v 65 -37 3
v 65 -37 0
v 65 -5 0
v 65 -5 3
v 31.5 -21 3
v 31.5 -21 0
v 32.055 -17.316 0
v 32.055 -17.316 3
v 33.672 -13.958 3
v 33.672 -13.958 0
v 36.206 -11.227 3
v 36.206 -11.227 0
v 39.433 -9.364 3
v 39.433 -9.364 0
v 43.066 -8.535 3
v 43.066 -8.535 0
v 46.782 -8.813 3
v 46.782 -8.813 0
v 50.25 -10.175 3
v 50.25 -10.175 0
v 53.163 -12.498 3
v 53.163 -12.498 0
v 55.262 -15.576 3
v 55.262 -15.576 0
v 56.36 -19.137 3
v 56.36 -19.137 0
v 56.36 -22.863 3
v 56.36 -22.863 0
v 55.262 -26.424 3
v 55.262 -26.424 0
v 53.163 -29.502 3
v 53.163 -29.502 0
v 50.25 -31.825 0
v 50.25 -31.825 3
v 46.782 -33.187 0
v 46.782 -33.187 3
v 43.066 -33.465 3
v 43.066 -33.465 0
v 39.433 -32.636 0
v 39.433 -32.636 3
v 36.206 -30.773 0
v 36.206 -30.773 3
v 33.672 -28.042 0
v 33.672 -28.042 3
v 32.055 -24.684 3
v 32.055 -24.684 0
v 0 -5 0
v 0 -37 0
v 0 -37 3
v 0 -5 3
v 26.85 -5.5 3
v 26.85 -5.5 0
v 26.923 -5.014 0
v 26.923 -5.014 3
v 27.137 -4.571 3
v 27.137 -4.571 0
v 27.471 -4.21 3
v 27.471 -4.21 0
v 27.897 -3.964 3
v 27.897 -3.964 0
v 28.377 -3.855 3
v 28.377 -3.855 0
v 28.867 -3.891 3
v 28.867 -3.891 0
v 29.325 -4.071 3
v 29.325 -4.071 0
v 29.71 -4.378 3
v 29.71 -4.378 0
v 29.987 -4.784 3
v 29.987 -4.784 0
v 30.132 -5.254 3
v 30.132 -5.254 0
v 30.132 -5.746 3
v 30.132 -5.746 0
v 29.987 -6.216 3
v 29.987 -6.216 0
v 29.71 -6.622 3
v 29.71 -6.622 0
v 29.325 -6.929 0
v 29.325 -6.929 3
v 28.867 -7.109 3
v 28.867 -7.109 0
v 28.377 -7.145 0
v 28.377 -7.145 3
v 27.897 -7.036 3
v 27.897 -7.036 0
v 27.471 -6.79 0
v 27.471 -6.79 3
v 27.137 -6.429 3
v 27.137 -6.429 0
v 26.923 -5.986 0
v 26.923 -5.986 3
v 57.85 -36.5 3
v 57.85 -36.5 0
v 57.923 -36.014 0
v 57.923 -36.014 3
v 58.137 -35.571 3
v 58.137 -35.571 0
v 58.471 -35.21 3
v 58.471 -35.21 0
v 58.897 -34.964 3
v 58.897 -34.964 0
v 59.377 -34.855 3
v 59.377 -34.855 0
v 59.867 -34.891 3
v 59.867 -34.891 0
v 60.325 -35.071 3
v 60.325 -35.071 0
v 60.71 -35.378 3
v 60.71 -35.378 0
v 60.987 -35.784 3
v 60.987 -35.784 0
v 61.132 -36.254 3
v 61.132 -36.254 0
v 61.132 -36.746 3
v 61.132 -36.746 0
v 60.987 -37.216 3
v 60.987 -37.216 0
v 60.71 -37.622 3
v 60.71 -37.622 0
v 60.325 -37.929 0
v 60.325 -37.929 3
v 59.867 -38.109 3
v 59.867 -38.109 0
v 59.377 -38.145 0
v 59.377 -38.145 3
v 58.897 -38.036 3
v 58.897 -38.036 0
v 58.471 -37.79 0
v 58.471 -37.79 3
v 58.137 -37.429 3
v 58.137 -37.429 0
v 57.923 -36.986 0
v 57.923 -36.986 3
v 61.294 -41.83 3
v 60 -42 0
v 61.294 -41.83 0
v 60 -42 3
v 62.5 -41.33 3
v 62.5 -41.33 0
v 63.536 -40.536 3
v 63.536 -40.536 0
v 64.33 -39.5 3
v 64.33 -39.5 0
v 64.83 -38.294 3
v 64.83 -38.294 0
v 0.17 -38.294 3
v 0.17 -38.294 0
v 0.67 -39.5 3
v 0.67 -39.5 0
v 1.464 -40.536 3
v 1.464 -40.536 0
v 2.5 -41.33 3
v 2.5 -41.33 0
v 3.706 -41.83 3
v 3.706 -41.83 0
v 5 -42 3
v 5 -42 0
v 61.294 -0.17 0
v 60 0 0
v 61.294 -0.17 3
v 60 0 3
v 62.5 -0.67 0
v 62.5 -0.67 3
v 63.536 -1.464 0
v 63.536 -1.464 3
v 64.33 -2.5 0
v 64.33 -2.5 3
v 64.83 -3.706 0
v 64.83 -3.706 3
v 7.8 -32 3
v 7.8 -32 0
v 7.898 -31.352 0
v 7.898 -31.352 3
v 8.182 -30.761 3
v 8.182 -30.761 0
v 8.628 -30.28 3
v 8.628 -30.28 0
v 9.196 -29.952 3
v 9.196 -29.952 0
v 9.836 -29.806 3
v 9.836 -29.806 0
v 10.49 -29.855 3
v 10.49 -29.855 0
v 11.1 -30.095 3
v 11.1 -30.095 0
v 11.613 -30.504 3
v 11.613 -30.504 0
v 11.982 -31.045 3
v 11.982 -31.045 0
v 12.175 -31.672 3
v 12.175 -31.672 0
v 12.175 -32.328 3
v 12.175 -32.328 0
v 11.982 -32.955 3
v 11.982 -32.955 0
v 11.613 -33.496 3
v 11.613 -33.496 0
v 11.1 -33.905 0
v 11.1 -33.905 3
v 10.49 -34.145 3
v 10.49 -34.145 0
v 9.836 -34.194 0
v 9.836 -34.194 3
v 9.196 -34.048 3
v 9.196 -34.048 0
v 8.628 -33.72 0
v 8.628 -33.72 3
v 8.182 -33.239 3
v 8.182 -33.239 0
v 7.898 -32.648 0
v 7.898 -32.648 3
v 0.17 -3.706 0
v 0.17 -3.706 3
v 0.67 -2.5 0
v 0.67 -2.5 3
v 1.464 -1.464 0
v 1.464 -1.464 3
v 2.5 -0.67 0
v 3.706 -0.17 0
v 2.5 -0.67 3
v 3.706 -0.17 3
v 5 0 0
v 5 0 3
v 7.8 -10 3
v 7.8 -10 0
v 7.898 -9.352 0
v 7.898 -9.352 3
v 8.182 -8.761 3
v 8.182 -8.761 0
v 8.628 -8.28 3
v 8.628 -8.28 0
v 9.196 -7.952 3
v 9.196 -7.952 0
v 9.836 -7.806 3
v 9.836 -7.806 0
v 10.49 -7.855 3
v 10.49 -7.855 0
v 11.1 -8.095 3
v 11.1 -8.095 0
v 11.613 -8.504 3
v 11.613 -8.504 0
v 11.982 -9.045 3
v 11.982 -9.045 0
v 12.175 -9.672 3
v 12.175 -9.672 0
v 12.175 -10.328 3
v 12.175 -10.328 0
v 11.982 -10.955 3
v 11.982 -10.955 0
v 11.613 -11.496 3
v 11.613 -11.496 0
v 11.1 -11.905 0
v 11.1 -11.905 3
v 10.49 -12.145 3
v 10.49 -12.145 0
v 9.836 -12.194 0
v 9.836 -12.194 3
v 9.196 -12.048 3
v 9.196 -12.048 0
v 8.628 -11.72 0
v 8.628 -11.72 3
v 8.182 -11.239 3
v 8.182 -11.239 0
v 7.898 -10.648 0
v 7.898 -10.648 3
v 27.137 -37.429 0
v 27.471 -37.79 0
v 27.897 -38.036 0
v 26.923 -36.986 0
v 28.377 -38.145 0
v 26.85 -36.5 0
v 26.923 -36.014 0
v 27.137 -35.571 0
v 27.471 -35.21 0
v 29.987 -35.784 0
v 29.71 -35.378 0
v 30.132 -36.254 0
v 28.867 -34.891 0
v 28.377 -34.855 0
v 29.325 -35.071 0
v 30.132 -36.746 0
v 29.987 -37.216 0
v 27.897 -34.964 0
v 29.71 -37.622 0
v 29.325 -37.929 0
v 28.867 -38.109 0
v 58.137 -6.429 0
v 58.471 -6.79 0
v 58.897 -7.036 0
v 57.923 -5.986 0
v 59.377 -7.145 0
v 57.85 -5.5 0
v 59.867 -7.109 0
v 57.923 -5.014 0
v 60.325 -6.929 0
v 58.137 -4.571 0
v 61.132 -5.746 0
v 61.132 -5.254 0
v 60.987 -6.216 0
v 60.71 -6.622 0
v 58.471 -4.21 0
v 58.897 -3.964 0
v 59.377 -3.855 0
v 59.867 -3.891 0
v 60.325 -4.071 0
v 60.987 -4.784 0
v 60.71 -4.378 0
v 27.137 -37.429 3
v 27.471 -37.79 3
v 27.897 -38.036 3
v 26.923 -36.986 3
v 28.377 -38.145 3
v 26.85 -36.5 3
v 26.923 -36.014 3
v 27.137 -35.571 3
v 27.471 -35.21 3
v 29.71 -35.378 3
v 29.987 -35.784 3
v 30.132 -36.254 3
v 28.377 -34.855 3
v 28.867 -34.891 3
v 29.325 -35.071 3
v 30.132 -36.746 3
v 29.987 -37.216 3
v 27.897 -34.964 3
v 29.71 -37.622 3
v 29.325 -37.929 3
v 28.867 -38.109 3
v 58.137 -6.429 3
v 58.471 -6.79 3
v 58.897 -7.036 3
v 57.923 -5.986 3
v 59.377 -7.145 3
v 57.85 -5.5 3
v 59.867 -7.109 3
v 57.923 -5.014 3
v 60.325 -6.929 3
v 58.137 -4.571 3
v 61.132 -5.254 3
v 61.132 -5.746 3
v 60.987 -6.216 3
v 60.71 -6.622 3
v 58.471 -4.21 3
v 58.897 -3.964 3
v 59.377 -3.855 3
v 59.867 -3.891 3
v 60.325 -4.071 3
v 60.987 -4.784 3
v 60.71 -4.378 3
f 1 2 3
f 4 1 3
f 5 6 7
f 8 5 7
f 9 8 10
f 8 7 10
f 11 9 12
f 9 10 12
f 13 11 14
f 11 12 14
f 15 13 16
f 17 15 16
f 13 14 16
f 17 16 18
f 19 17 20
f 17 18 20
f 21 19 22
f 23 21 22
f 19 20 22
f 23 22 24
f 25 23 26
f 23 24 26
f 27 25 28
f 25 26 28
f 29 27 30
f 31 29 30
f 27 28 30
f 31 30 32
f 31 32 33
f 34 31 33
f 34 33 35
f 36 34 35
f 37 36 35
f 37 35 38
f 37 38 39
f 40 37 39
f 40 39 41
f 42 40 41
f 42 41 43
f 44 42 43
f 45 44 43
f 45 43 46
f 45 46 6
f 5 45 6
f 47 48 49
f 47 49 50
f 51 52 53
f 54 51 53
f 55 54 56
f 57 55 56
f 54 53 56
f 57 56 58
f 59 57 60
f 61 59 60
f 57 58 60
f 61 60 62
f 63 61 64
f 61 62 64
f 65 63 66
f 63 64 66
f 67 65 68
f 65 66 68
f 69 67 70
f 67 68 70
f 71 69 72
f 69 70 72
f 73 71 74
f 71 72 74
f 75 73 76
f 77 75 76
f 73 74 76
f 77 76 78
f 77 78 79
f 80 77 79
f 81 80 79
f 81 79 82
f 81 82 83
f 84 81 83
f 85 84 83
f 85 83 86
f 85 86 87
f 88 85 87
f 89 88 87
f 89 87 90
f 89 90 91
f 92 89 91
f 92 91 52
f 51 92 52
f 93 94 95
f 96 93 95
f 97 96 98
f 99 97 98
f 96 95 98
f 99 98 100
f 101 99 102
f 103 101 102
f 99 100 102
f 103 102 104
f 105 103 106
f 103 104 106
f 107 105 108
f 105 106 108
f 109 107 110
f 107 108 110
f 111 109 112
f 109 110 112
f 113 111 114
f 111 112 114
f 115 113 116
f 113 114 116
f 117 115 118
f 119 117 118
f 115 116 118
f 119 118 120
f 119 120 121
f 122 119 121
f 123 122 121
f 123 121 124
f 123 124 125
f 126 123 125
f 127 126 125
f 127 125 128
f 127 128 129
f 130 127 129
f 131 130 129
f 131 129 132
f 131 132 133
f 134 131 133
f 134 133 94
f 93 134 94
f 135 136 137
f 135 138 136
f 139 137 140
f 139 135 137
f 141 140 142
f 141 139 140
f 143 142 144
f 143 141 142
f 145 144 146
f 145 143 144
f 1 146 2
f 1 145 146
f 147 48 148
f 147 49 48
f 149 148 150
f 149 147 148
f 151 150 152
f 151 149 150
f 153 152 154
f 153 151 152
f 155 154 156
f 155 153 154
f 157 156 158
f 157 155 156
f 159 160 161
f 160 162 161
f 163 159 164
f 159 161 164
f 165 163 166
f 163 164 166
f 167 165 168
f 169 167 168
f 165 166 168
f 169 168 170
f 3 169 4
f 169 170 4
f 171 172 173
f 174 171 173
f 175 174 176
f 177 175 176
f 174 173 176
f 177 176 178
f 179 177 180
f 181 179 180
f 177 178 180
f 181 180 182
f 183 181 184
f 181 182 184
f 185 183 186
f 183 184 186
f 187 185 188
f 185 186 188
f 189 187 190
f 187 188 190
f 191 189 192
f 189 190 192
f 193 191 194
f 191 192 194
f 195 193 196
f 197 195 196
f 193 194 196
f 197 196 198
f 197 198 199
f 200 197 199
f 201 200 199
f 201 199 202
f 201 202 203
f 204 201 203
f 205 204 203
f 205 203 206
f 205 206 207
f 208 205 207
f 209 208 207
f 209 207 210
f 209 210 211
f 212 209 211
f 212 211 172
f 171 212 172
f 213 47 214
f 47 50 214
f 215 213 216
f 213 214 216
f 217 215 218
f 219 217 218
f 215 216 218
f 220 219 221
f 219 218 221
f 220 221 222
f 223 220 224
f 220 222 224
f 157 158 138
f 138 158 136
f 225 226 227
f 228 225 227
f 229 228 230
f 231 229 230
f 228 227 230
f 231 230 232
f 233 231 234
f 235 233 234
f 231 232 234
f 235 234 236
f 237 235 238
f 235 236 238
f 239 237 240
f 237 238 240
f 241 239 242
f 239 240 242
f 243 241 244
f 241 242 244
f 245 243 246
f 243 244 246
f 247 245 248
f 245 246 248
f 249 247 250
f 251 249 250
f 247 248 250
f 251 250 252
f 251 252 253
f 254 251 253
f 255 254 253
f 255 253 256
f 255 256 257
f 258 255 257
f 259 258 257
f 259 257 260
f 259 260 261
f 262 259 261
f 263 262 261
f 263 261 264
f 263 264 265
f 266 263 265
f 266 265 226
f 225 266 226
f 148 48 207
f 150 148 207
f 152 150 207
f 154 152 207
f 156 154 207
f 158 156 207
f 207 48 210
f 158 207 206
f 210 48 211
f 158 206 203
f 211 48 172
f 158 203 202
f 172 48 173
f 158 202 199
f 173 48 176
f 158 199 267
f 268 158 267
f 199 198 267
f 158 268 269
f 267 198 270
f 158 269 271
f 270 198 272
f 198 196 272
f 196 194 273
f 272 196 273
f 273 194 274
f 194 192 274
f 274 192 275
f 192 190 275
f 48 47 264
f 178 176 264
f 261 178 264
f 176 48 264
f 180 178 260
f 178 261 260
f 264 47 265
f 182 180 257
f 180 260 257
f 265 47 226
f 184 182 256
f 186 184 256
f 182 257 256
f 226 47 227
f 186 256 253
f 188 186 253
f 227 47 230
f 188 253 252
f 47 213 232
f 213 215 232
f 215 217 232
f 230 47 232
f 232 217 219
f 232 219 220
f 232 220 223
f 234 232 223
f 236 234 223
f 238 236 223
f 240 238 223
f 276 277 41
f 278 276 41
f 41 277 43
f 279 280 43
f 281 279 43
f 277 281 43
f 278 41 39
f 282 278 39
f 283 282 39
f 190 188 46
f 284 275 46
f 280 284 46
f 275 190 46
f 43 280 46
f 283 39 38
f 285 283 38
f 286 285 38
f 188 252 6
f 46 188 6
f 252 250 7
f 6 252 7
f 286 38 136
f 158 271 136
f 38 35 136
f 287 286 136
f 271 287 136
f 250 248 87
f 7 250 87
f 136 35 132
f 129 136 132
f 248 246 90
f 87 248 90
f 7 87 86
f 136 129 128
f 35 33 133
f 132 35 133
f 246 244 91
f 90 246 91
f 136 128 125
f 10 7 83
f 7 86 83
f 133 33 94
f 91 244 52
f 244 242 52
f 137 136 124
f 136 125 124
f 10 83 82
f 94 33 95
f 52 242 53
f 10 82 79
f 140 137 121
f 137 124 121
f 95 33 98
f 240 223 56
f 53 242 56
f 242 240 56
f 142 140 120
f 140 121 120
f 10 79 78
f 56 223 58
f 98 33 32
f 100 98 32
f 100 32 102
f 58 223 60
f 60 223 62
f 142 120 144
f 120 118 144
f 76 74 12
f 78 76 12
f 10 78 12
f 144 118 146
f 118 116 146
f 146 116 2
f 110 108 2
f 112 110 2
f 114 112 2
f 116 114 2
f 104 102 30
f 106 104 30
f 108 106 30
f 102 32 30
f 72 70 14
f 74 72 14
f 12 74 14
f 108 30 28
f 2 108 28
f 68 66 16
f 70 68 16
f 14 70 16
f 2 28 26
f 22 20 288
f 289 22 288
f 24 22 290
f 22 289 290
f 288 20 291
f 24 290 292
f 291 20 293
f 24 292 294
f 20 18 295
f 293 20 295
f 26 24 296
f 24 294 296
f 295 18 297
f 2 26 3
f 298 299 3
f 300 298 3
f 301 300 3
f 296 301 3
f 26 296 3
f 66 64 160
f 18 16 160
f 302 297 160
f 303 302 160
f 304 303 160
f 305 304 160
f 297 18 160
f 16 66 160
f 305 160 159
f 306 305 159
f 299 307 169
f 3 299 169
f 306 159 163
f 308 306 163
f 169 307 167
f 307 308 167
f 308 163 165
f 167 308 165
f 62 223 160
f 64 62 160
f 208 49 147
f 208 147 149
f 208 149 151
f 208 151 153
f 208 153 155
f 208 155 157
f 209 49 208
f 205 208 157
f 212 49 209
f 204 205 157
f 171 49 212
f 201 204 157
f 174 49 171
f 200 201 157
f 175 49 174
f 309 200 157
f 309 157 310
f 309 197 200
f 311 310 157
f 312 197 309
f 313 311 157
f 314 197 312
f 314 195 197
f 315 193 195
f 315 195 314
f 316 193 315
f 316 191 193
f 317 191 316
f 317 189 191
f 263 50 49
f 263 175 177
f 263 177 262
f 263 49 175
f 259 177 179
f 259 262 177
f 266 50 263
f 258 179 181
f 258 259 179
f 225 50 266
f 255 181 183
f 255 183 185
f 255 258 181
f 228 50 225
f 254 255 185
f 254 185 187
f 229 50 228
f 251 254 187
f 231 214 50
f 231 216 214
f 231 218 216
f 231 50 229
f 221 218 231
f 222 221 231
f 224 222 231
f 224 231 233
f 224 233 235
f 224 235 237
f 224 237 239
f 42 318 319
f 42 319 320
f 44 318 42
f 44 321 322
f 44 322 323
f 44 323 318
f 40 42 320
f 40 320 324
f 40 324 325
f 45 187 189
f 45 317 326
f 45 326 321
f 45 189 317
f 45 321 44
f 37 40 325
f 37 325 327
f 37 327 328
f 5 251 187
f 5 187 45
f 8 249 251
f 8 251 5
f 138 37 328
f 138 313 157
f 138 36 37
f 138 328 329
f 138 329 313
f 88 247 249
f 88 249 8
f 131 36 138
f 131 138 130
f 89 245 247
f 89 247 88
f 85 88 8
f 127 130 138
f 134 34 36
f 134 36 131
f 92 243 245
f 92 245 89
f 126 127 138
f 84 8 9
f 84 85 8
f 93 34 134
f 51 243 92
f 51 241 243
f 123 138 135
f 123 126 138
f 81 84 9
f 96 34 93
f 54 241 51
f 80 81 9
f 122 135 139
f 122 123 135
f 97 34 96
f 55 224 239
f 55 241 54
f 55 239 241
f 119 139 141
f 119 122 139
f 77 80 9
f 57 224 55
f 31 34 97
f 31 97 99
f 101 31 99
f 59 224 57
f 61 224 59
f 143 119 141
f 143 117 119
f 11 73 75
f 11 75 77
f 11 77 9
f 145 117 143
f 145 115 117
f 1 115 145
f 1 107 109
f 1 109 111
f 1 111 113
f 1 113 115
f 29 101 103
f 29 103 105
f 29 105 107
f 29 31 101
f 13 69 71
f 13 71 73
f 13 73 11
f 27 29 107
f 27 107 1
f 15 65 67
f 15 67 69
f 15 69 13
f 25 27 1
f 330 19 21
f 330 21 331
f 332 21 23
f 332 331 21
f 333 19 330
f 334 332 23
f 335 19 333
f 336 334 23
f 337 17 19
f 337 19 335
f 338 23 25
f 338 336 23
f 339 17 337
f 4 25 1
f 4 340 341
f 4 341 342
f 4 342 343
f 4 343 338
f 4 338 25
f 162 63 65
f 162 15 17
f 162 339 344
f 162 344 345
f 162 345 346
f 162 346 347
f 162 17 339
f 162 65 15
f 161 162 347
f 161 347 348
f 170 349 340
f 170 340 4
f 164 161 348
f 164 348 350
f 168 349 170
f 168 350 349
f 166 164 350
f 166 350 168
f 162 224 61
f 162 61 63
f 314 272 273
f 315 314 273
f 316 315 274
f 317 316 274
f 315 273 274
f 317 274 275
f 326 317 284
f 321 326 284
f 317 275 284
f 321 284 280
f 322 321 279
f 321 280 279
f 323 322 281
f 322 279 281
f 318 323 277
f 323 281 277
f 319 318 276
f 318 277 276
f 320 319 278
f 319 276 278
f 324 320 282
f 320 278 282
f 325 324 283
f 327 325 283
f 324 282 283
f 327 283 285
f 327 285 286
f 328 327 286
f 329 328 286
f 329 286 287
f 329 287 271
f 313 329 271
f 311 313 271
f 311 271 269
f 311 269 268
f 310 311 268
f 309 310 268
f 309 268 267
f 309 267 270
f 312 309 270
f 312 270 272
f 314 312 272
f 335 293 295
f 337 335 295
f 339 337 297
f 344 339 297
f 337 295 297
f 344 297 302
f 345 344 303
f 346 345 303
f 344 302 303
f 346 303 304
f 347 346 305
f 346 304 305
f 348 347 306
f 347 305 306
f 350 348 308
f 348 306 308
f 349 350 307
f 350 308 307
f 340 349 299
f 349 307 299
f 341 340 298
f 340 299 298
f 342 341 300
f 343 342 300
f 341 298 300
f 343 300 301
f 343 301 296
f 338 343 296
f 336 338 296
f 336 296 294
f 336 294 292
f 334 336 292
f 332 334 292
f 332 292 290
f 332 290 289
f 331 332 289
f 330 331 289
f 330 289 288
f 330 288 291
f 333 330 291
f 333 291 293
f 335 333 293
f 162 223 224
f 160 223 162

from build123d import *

# Parameters (mm, degrees)
F0_W     = 65
F0_H     = 42
F1_DEPTH = 3
F3_D     = 3.3
F4_D     = 4.4
F5_D     = 25
F6_R     = 5


with BuildPart() as f1:
    # F0 (on Top) → F1 (new body)
    with BuildSketch(Plane.XY):
        with Locations((32.5, -21)):
            Rectangle(F0_W, F0_H)
    extrude(amount=F1_DEPTH)

    # F3 (through all)
    with Locations(Plane.XY.offset(3)):
        with Locations((28.5, -5.5), (28.5, -36.5), (59.5, -36.5), (59.5, -5.5)):
            Hole(F3_D / 2)

    # F4 (through all)
    with Locations(Plane.XY.offset(3)):
        with Locations((10, -10), (10, -32)):
            Hole(F4_D / 2)

    # F5 (through all)
    with Locations(Plane.XY.offset(3)):
        with Locations((44, -21)):
            Hole(F5_D / 2)

    # F6
    f6_edges = [f1.edges().sort_by_distance(p)[0] for p in [
        (0, -42, 1.5),
        (65, -42, 1.5),
        (65, 0, 1.5),
        (0, 0, 1.5),
    ]]
    fillet(f6_edges, radius=F6_R)


solid = f1.part
